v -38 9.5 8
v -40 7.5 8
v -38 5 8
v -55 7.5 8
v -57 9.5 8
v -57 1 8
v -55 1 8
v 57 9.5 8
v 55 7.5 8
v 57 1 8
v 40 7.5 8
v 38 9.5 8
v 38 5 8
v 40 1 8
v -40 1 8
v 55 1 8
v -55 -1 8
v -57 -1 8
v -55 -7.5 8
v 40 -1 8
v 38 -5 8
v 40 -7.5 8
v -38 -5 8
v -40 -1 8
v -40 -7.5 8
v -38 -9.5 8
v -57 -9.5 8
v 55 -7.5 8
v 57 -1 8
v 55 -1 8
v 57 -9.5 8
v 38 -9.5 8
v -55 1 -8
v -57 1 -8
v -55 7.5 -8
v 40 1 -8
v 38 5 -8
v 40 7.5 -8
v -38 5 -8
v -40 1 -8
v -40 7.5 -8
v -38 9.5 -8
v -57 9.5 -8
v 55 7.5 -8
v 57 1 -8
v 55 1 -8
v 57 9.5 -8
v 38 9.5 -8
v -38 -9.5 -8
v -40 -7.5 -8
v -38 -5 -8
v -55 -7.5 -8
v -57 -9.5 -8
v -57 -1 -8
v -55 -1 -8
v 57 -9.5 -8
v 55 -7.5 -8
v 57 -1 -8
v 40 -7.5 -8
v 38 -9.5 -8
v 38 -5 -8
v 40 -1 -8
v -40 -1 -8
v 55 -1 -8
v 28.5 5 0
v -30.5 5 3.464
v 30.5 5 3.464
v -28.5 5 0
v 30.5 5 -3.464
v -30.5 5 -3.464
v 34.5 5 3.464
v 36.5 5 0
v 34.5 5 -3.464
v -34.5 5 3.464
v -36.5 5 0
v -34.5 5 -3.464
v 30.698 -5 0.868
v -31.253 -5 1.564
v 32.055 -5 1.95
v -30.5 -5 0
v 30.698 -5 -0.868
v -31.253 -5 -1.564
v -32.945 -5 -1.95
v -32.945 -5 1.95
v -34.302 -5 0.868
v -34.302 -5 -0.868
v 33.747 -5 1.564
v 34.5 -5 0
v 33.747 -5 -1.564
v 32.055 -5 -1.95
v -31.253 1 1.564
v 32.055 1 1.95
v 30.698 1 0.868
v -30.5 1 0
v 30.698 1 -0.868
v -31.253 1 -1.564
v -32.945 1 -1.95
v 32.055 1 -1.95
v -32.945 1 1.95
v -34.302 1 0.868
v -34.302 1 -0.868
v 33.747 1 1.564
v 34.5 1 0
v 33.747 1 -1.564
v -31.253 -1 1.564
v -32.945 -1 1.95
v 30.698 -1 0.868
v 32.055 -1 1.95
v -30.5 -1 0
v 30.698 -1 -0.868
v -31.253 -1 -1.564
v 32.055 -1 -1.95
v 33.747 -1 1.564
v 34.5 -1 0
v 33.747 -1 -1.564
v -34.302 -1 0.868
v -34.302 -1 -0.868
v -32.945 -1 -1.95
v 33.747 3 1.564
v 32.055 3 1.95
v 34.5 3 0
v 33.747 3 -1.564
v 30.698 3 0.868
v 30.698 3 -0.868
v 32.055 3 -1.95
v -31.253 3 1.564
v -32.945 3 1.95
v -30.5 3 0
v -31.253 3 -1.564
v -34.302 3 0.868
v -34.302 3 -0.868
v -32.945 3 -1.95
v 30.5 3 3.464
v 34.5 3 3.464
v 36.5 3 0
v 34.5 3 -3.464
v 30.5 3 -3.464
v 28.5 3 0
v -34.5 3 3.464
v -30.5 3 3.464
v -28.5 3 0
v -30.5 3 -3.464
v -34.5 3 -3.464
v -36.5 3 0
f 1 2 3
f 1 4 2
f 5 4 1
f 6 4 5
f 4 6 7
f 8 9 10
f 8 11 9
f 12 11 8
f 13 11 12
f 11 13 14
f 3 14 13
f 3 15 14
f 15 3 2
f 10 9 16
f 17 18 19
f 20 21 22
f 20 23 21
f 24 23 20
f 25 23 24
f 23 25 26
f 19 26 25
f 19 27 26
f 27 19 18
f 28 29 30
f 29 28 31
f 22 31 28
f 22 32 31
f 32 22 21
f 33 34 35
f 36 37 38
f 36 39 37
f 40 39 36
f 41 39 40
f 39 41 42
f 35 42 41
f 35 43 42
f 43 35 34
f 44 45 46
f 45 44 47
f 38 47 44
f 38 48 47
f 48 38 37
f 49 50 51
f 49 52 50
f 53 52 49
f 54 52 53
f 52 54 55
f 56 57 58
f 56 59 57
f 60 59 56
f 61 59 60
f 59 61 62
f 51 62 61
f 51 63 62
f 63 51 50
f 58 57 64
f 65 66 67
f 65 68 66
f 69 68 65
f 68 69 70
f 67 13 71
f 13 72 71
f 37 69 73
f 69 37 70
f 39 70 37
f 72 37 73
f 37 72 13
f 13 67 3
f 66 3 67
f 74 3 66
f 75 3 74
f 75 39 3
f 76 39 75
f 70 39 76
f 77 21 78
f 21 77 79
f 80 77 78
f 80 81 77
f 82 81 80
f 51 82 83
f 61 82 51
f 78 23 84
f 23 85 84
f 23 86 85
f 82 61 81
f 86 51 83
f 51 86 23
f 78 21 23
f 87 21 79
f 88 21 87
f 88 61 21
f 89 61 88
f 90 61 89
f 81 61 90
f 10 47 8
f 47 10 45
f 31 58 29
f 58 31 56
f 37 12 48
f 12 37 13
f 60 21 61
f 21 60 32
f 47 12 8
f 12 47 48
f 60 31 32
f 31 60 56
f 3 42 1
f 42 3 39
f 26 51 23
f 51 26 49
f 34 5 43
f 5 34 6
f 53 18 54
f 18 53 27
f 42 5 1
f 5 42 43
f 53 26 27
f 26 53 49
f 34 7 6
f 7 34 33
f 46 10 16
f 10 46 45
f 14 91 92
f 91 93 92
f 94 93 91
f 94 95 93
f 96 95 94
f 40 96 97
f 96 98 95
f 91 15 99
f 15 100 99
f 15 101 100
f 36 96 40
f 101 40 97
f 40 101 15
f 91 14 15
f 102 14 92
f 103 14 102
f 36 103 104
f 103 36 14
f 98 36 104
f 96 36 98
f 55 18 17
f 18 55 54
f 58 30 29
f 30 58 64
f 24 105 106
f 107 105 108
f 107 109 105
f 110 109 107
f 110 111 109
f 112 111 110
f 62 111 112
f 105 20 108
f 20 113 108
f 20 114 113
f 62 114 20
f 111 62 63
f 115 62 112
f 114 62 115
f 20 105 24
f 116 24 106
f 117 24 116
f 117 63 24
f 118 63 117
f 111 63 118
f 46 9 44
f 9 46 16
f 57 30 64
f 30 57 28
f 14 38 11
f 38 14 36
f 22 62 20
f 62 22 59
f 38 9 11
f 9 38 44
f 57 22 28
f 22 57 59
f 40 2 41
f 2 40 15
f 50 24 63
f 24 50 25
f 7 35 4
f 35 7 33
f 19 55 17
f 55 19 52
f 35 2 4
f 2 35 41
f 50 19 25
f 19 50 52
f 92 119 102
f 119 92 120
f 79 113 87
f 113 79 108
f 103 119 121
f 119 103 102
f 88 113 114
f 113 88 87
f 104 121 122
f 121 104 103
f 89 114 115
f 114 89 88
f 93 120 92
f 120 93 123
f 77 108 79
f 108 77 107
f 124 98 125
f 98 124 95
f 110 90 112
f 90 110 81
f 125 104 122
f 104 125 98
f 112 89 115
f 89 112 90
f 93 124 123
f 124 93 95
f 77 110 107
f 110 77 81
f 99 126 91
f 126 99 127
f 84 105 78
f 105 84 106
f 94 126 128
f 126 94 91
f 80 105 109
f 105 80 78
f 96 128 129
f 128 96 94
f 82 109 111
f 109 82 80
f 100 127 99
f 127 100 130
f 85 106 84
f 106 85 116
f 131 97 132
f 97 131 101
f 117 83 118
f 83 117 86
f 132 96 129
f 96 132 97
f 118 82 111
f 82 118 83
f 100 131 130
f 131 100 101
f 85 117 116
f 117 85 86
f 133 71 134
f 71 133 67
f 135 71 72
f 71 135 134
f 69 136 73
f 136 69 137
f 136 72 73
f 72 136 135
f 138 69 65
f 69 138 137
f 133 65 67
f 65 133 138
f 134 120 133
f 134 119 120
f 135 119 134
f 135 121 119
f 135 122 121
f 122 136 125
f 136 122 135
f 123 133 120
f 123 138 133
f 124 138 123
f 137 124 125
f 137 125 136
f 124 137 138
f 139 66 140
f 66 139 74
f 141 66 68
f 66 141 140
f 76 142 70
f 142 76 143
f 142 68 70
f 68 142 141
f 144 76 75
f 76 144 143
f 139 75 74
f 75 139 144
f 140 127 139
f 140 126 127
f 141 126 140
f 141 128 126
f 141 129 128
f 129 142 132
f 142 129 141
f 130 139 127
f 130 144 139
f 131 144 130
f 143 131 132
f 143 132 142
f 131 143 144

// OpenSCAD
//Fix trash cans in the drawers
//Motivation: stock mounts were colliding with something
wall=2;
width=10;
depth=16;
hole=4;
nut=8;
length=80+15;
gap=2;
bissl=1/100;
difference() {
union(){
cube([length,width,depth],center=true);
translate([length/2,0,0])cube([15+2*wall,15+2*wall,depth],center=true);
translate([-length/2,0,0])cube([15+2*wall,15+2*wall,depth],center=true);
}
cube([length+15+2*wall+bissl,gap,depth+bissl],center=true);
translate([length/2,0,0])cube([15,15,depth+bissl],center=true);
translate([-length/2,0,0])cube([15,15,depth+bissl],center=true);
translate([length/2-15,0,0])rotate([90,0,0])cylinder(d=hole, h=width+bissl, center=true);
translate([-length/2+15,0,0])rotate([90,0,0])cylinder(d=hole, h=width+bissl, center=true);
translate([length/2-15,gap/2+wall,0])rotate([-90,0,0])cylinder(d=nut, h=width, $fn=6);
translate([-length/2+15,gap/2+wall,0])rotate([-90,0,0])cylinder(d=nut, h=width, $fn=6);

}
